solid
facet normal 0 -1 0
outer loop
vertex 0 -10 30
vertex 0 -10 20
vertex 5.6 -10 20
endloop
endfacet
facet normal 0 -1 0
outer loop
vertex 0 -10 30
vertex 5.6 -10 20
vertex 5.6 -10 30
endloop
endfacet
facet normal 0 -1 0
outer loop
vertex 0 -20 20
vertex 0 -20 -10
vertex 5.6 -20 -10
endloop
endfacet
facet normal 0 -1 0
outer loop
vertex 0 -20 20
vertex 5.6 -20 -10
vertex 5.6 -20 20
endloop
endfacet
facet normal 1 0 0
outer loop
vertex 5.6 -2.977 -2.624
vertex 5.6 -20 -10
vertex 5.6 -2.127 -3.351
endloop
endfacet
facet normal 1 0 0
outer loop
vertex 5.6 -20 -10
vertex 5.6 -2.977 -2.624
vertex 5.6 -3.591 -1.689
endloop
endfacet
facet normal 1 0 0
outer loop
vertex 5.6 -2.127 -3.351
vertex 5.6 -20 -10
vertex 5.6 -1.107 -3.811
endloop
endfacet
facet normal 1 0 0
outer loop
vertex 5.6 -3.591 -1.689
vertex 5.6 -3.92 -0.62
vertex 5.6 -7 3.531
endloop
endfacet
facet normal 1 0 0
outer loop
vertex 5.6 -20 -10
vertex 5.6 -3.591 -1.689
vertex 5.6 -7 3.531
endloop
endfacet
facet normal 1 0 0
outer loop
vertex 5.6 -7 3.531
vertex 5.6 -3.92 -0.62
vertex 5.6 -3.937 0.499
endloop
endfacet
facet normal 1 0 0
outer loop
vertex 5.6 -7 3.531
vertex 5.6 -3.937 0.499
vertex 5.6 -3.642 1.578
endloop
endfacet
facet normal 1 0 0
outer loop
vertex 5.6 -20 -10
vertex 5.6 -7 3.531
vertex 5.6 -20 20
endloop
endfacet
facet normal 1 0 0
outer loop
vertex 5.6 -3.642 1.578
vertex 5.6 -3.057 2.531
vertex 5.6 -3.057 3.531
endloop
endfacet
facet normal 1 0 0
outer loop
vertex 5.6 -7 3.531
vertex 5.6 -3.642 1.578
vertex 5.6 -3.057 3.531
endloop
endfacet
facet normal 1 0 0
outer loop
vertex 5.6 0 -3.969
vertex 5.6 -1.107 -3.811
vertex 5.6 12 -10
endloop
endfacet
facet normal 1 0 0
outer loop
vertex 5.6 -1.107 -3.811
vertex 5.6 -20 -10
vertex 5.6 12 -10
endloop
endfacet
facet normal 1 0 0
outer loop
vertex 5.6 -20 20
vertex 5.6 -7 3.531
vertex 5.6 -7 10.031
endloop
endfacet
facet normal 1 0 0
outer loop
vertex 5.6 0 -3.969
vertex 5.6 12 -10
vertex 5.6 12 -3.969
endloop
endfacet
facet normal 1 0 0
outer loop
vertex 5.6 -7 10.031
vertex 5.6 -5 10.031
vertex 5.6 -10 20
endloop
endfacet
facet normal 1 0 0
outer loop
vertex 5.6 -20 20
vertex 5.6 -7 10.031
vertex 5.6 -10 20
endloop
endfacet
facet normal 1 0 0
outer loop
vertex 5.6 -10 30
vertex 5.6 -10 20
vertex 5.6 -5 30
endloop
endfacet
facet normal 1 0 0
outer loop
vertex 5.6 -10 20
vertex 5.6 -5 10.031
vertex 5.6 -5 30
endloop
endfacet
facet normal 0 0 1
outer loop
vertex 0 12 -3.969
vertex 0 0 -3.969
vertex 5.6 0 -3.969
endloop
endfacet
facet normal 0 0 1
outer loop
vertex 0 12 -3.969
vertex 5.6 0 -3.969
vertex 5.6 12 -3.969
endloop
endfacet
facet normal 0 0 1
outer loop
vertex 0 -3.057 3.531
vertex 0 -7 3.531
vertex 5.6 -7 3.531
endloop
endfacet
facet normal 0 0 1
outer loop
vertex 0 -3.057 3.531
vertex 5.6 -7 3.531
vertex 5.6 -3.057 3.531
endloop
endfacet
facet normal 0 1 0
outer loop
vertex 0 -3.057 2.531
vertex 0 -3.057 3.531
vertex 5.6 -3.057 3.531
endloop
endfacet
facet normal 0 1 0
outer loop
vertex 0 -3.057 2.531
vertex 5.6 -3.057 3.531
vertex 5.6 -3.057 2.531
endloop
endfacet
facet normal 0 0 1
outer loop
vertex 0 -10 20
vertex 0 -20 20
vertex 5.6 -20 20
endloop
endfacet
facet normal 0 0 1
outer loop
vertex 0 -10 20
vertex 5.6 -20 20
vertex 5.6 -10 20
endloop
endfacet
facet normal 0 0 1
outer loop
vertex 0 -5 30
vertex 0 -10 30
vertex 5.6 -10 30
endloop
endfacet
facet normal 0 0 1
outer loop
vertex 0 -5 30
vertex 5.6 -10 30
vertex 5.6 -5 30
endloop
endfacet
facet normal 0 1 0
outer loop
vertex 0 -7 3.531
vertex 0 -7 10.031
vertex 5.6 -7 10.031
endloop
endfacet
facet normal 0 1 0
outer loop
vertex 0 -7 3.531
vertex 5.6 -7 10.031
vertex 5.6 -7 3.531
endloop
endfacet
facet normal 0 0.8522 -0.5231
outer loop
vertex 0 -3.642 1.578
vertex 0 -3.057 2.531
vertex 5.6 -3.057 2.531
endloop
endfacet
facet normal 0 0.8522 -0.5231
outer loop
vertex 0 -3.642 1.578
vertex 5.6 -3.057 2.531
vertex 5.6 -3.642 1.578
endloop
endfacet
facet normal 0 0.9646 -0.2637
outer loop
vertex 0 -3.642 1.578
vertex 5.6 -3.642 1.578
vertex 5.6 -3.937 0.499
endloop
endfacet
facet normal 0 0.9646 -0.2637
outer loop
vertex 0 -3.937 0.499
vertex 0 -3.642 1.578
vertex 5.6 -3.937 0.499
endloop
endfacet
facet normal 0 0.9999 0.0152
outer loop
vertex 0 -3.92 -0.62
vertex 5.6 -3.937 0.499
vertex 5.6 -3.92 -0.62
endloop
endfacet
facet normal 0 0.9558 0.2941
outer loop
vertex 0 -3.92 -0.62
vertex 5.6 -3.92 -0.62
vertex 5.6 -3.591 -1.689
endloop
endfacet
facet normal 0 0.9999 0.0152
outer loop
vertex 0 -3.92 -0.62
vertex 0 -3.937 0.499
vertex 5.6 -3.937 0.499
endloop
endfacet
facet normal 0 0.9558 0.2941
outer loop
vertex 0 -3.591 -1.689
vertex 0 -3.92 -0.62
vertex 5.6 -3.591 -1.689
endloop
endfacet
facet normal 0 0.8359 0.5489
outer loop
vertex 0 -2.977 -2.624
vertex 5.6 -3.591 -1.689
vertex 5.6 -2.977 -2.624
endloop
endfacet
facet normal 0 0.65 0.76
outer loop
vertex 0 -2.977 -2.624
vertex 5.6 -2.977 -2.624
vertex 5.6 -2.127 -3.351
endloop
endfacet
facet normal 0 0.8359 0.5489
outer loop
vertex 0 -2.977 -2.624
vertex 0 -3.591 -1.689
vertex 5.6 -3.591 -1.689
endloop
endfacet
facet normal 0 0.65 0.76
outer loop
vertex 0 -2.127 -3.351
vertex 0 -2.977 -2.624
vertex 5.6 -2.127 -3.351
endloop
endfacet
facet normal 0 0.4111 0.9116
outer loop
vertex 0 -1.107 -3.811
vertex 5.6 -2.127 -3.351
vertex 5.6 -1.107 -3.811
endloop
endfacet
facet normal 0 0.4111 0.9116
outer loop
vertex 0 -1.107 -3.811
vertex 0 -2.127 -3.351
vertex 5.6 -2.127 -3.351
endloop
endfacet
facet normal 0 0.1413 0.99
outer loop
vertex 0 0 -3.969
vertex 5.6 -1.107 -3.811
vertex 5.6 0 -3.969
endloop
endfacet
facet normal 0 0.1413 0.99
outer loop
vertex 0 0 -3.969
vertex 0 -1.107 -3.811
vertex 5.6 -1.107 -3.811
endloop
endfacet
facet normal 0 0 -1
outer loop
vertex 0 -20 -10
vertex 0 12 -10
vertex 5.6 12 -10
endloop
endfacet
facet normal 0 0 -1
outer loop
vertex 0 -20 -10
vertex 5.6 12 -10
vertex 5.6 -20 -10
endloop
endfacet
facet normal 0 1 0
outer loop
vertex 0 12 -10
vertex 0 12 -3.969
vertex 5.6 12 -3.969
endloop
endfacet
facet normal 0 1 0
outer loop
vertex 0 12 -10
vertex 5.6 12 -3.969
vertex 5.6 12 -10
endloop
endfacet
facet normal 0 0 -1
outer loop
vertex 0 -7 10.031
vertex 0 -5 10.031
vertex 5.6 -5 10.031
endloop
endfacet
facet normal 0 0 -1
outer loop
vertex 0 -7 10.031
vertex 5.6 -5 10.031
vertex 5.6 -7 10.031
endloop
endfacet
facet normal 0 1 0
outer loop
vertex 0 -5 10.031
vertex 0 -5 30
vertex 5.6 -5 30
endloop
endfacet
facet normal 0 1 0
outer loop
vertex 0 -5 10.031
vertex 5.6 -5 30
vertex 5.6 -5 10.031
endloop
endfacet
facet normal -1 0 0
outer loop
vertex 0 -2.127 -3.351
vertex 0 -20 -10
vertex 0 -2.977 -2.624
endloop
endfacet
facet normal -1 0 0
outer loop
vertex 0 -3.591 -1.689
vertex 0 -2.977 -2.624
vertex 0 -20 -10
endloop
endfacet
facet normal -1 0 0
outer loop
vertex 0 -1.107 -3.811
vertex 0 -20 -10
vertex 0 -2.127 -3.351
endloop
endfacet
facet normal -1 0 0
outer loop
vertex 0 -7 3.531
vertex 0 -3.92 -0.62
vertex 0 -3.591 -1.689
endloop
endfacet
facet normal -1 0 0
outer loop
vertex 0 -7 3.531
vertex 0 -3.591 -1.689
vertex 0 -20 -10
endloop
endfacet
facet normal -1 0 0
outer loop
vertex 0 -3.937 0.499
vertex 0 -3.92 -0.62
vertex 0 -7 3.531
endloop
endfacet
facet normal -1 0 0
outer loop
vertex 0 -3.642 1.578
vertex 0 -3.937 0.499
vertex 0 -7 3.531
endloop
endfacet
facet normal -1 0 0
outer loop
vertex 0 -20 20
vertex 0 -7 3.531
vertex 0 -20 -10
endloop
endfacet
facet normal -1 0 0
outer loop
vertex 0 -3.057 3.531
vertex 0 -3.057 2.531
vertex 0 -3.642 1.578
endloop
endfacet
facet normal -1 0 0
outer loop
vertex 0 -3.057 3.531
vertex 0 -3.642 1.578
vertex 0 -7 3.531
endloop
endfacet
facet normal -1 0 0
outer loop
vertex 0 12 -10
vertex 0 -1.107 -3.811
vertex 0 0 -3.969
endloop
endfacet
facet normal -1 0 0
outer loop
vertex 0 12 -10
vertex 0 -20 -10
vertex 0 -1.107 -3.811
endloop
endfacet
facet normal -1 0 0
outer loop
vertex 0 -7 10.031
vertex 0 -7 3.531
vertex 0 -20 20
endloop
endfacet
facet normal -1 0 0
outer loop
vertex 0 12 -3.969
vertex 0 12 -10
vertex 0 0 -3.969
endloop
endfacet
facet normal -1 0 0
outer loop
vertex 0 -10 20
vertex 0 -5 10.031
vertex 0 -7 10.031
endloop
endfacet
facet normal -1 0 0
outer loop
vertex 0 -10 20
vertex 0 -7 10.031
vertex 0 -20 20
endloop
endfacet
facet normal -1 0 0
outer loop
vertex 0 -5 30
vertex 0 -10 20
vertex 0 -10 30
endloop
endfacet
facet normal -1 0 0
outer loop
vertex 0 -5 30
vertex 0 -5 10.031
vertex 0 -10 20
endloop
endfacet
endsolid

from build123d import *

# Parameters (mm, degrees)
BOSS_EXTRUDE1_DEPTH = 5.6


with BuildPart() as part:
    # Sketch1 → Boss-Extrude1 (new body)
    with BuildSketch(Plane(origin=(0, 0, 0), x_dir=(0, 0, -1), z_dir=(1, 0, 0))):
        with BuildLine():
            Line((3.96875, 0), (3.96875, 12))
            Line((3.96875, 12), (10, 12))
            Line((10, 12), (10, -20))
            Line((10, -20), (-20, -20))
            Line((-20, -20), (-20, -10))
            Line((-20, -10), (-30, -10))
            Line((-30, -10), (-30, -5))
            Line((-30, -5), (-10.03125, -5))
            Line((-10.03125, -5), (-10.03125, -7))
            Line((-10.03125, -7), (-3.53125, -7))
            Line((-3.53125, -7), (-3.53125, -3.056754815))
            Line((-3.53125, -3.056754815), (-2.53125, -3.056754815))
            ThreePointArc((-2.53125, -3.056754815), (1.68894614, -3.591439475), (3.96875, 0))
        make_face()
    extrude(amount=BOSS_EXTRUDE1_DEPTH)


solid = part.part
